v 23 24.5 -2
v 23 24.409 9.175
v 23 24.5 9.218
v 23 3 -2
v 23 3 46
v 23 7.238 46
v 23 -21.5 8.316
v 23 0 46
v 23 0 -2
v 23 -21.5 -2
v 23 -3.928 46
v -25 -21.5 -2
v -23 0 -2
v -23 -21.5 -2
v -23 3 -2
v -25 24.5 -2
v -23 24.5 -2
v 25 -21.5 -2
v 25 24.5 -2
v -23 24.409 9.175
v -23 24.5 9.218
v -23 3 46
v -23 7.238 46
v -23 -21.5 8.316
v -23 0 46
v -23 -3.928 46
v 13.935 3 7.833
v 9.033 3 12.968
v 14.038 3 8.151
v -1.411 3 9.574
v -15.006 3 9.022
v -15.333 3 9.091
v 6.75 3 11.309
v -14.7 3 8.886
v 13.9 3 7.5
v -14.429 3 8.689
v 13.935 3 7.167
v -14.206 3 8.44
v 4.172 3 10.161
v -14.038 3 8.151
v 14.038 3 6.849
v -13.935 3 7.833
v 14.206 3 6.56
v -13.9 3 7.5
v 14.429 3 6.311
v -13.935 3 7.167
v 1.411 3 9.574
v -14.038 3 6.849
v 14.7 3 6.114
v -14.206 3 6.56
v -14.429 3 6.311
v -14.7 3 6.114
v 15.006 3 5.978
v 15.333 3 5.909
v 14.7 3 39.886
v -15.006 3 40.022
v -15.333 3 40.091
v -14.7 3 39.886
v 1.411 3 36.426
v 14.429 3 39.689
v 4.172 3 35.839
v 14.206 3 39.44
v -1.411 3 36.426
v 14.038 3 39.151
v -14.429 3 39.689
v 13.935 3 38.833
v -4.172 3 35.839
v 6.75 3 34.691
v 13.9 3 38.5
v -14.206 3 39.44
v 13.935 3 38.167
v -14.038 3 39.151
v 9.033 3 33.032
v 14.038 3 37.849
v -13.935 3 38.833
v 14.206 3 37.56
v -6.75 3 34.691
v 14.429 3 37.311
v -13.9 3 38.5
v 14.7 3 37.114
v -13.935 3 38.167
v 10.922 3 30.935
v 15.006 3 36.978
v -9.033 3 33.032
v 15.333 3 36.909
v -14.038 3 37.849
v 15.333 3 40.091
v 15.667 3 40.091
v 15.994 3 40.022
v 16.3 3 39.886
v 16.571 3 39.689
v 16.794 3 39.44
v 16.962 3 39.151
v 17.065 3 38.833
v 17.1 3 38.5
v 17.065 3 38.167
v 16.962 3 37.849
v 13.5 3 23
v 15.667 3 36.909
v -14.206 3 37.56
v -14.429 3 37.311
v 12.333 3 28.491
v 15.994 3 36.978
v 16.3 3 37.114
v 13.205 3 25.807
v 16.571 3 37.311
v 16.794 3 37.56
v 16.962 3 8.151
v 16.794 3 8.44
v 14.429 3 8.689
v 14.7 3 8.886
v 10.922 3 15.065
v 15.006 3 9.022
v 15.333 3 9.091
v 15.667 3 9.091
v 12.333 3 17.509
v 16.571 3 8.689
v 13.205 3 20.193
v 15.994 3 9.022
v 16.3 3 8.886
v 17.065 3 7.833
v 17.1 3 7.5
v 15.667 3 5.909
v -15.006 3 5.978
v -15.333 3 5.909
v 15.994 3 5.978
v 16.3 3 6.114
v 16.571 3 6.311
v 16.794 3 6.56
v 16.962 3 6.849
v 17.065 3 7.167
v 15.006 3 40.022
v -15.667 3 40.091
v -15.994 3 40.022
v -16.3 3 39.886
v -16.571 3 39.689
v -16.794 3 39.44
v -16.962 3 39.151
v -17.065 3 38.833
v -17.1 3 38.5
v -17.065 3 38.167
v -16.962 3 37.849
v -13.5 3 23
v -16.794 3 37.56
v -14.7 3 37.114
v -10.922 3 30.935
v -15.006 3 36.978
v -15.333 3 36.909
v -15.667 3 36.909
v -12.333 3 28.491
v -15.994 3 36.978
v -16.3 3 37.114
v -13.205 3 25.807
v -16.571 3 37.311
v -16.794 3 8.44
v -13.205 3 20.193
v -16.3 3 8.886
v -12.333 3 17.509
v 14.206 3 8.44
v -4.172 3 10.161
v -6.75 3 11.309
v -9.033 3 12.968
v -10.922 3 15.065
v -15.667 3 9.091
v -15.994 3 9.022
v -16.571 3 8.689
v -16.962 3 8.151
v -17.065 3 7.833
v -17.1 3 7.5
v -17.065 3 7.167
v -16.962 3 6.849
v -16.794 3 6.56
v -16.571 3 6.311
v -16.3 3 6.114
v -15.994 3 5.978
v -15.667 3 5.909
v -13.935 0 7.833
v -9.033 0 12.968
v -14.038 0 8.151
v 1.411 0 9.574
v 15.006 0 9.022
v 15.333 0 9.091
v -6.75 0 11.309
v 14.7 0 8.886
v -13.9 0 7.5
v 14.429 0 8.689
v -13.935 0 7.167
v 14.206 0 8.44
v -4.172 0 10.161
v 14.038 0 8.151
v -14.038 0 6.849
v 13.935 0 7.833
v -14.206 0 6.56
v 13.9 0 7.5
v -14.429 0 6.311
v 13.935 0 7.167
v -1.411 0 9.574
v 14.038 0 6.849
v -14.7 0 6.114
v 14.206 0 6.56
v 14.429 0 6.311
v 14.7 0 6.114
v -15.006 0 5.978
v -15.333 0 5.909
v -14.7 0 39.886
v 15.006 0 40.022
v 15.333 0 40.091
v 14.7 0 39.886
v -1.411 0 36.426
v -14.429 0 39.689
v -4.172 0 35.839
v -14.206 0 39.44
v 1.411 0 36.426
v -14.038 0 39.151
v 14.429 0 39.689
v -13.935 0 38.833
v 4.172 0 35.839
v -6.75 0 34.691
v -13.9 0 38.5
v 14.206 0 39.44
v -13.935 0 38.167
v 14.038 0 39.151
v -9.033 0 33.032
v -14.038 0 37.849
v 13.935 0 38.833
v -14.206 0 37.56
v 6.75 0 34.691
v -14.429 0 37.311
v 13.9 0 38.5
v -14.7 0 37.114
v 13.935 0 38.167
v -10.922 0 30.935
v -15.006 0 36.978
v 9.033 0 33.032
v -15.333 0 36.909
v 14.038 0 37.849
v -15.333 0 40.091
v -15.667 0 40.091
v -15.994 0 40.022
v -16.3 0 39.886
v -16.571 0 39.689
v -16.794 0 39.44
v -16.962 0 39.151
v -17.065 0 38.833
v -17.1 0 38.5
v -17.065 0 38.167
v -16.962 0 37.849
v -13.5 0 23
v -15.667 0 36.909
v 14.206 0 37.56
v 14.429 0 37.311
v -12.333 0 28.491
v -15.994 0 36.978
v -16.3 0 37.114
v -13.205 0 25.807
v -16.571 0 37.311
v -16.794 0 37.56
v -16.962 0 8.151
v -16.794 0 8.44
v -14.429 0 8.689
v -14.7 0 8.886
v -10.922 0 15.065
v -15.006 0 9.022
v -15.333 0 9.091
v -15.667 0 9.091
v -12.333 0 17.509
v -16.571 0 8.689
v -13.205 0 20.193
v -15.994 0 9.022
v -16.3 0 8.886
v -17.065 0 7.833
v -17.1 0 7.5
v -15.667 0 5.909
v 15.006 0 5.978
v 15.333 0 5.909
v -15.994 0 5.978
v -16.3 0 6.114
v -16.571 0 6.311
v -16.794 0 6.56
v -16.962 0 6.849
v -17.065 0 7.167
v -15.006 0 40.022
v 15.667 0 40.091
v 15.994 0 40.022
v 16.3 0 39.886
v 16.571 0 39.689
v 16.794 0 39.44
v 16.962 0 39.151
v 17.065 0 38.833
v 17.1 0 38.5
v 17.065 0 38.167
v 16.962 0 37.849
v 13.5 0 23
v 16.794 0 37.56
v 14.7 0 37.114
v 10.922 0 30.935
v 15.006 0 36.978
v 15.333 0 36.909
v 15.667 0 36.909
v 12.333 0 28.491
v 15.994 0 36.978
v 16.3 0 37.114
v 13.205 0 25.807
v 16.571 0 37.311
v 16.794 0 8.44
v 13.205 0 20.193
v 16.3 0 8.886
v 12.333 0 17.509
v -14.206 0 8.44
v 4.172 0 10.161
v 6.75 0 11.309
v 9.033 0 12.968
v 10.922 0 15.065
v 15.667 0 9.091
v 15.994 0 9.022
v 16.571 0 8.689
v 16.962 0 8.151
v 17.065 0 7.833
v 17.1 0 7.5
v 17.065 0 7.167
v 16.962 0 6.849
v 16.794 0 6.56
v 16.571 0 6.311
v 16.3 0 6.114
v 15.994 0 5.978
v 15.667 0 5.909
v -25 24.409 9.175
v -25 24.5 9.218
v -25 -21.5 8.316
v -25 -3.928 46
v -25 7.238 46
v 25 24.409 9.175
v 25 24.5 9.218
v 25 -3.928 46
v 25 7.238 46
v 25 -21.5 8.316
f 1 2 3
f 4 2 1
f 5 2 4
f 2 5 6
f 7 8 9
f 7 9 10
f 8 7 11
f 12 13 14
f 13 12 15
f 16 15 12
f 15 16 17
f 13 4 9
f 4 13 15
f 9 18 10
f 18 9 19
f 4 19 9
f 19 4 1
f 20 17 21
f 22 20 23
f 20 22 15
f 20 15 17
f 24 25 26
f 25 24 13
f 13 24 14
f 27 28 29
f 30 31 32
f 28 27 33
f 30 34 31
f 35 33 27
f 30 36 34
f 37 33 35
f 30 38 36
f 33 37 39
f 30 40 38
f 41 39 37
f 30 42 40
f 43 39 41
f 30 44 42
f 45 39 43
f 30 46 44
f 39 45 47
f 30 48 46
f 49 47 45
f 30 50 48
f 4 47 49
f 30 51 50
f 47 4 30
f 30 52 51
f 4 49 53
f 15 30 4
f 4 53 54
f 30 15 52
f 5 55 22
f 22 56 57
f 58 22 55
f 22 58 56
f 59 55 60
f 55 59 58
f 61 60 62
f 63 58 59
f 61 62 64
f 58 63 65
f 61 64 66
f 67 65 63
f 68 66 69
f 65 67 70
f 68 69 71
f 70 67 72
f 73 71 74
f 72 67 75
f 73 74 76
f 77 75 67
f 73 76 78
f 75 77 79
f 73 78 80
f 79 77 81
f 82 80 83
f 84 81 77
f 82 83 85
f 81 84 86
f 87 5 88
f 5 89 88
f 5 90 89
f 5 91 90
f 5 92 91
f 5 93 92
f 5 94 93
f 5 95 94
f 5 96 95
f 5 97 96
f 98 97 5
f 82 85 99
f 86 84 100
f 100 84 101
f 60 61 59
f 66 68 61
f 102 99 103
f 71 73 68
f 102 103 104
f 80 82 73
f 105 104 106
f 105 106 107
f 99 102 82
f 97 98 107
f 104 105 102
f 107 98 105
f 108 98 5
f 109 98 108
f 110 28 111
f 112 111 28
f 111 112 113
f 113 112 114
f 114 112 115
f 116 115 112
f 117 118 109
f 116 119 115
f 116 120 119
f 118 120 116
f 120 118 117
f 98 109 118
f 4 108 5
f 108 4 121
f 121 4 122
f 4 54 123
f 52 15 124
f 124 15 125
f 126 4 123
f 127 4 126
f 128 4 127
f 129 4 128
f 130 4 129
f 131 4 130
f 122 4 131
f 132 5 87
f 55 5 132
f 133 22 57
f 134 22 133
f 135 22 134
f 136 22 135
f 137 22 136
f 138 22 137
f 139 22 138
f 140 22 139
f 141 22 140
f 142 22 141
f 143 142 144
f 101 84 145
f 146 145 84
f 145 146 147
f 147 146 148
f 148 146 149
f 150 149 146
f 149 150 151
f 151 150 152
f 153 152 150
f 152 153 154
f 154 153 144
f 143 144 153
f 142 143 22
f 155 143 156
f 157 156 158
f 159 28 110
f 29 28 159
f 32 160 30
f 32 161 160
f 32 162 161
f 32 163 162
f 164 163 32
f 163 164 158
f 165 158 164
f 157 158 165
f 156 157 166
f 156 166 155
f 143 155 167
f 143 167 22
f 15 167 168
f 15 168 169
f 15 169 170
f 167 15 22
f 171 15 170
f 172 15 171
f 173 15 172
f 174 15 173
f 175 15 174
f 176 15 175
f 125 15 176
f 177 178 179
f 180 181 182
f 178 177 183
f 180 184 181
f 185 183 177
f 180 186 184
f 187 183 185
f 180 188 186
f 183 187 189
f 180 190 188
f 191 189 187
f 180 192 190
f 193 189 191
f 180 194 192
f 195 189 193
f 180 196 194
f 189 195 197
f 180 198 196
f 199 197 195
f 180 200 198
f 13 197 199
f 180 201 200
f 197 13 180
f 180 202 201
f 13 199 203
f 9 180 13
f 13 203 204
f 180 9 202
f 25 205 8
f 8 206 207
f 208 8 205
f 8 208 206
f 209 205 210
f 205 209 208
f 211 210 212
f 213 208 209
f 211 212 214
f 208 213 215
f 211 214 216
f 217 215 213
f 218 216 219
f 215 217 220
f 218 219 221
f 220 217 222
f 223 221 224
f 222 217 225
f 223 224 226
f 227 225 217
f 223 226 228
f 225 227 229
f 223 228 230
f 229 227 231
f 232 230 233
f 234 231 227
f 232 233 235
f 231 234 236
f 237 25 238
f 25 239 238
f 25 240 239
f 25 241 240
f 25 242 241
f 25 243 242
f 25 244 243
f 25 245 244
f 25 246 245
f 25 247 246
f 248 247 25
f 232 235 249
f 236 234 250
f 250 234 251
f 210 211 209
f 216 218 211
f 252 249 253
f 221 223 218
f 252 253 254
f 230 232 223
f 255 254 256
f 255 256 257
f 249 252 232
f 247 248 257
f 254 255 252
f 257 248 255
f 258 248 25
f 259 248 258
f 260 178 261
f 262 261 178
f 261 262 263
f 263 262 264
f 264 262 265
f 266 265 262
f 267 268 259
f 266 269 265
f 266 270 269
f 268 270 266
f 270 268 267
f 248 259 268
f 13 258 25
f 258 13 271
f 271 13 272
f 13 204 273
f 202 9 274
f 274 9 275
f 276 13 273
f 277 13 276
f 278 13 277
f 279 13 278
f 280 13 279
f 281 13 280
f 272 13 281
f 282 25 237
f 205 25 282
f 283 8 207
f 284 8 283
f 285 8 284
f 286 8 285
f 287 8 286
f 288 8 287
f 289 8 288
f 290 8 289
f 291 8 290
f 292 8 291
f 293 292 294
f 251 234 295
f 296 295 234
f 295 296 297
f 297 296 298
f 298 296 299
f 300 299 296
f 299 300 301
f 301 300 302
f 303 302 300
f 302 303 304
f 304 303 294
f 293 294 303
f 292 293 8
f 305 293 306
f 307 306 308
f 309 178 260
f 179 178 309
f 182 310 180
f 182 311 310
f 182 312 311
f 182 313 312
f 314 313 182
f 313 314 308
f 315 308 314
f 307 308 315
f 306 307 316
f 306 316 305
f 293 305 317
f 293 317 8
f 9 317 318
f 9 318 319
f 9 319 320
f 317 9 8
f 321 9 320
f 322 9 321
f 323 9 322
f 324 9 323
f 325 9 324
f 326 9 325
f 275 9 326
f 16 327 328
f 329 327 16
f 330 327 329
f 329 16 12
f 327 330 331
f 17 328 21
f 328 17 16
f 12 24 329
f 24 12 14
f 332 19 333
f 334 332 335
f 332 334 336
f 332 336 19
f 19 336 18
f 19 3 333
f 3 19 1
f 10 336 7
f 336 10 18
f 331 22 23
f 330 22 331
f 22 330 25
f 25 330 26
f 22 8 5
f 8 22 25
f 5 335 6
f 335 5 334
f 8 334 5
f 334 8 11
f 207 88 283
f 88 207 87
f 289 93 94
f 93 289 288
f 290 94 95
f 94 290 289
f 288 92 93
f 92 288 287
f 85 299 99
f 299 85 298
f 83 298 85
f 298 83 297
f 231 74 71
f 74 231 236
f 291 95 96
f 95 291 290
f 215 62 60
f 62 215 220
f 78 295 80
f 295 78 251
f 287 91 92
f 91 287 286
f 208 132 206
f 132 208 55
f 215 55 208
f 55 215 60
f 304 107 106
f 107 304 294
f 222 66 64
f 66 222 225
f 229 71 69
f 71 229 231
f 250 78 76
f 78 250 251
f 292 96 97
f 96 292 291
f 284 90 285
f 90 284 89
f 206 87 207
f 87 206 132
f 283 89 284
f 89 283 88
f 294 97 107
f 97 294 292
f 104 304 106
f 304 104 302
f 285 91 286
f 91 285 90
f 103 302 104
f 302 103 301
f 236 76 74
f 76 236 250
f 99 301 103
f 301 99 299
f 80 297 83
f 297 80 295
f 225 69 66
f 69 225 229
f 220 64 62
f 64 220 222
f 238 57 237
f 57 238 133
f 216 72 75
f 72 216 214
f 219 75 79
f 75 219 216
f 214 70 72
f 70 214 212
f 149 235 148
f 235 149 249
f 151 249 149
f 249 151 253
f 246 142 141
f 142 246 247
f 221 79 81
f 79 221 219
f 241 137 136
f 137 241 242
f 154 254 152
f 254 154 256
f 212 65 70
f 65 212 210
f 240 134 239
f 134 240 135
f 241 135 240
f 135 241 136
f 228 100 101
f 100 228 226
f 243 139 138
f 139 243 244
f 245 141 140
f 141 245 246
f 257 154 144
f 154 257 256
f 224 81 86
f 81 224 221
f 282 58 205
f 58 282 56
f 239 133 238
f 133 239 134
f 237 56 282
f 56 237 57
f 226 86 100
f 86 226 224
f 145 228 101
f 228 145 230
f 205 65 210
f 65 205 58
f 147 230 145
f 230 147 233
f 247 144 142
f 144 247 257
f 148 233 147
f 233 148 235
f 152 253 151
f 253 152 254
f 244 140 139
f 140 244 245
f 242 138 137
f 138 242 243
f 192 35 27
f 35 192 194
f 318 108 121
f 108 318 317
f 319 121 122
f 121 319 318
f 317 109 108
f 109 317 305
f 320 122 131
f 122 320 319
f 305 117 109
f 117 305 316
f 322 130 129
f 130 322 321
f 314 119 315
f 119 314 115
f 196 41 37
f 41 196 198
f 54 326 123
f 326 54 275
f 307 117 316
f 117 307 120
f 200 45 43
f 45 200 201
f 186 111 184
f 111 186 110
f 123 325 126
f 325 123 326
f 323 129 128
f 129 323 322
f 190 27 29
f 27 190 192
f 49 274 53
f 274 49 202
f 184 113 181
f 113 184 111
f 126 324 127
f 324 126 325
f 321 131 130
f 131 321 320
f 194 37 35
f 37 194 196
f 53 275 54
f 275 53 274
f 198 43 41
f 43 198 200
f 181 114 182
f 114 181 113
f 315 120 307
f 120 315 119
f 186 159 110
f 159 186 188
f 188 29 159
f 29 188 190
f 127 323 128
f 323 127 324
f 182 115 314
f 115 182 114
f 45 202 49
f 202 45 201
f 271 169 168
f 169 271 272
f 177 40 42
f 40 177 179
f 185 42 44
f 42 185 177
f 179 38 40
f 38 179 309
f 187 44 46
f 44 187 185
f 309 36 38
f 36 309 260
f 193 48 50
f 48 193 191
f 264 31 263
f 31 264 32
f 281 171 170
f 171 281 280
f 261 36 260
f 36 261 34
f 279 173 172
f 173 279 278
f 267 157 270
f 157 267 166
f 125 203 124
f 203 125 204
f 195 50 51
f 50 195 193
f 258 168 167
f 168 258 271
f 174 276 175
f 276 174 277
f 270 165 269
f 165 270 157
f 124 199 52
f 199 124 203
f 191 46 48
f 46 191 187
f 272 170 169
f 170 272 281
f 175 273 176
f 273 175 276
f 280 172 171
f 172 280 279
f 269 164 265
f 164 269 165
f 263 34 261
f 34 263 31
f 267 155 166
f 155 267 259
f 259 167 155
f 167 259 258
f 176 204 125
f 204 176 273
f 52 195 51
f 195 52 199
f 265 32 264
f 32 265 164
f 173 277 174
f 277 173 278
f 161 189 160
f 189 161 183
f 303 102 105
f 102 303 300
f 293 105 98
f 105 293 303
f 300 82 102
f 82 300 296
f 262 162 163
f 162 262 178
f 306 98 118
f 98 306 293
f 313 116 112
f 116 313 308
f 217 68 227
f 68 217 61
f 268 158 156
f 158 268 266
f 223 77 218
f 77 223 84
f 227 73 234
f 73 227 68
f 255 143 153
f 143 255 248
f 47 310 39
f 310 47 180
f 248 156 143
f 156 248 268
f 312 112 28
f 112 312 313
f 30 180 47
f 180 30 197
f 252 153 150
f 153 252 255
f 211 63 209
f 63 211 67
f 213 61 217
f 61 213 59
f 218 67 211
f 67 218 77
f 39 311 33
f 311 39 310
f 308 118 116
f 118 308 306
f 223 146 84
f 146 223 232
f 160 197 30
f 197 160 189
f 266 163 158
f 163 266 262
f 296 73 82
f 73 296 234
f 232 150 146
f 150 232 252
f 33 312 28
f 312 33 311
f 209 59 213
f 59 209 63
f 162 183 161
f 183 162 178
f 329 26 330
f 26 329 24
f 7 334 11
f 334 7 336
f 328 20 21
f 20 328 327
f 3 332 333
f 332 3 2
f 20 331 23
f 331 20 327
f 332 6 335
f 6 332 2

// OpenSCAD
motorSupport();

module motorSupport() {

    $fn = 30;
	wall_thickness = 3;
	motor_height = 42;
	height = motor_height / 2;
    height_offset = 2;
	frame_width = motor_height + 2*height_offset;
	bolt = 3.2;
		
    translate([-frame_width/2, 0, 0]) 
        difference() {
            union() {
                
                cube([frame_width, wall_thickness, frame_width]); 
                
                translate([-2, -(frame_width - wall_thickness)/2, 0]) 
                    cube([wall_thickness - 1, frame_width, frame_width]);
                
                translate([frame_width, -(frame_width - wall_thickness)/2, 0]) 
                    cube([wall_thickness - 1, frame_width, frame_width]);
                
                translate([0, 0, -2])  {
                    cube([frame_width, wall_thickness, 4]); 
                    translate([-2, -(frame_width - wall_thickness)/2, 0]) 
                        cube([wall_thickness - 1, frame_width, 4]);
                    
                    translate([frame_width, -(frame_width - wall_thickness)/2, 0]) 
                        cube([wall_thickness - 1, frame_width, 4]);
                }
            }
        
            rotate([90, 0, 0]) {
                translate([frame_width/2, height + height_offset, -wall_thickness - 1]) {
                    translate([15.5, 15.5, 0])
                        cylinder(r=bolt/2, h= wall_thickness + 2);
                    translate([-15.5, 15.5, 0])
                        cylinder(r=bolt/2, h= wall_thickness + 2);
                    translate([15.5, -15.5, 0])
                        cylinder(r=bolt/2, h= wall_thickness + 2);
                    translate([-15.5, -15.5, 0])
                        cylinder(r=bolt/2, h= wall_thickness + 2);

                    cylinder(r=13.5, h = wall_thickness + 2);
                }
            }
            
            //wall cuts
            rotate([-25, 0, 0]) 
                translate([-wall_thickness, -frame_width, -2]) 
                    cube([frame_width + 2*wall_thickness, frame_width/2, frame_width]);
            
            rotate([25, 0, 0]) 
                translate([-wall_thickness, frame_width/2 + wall_thickness, -2]) 
                    cube([frame_width + 2*wall_thickness, frame_width/2, frame_width]);
            
        }
}
